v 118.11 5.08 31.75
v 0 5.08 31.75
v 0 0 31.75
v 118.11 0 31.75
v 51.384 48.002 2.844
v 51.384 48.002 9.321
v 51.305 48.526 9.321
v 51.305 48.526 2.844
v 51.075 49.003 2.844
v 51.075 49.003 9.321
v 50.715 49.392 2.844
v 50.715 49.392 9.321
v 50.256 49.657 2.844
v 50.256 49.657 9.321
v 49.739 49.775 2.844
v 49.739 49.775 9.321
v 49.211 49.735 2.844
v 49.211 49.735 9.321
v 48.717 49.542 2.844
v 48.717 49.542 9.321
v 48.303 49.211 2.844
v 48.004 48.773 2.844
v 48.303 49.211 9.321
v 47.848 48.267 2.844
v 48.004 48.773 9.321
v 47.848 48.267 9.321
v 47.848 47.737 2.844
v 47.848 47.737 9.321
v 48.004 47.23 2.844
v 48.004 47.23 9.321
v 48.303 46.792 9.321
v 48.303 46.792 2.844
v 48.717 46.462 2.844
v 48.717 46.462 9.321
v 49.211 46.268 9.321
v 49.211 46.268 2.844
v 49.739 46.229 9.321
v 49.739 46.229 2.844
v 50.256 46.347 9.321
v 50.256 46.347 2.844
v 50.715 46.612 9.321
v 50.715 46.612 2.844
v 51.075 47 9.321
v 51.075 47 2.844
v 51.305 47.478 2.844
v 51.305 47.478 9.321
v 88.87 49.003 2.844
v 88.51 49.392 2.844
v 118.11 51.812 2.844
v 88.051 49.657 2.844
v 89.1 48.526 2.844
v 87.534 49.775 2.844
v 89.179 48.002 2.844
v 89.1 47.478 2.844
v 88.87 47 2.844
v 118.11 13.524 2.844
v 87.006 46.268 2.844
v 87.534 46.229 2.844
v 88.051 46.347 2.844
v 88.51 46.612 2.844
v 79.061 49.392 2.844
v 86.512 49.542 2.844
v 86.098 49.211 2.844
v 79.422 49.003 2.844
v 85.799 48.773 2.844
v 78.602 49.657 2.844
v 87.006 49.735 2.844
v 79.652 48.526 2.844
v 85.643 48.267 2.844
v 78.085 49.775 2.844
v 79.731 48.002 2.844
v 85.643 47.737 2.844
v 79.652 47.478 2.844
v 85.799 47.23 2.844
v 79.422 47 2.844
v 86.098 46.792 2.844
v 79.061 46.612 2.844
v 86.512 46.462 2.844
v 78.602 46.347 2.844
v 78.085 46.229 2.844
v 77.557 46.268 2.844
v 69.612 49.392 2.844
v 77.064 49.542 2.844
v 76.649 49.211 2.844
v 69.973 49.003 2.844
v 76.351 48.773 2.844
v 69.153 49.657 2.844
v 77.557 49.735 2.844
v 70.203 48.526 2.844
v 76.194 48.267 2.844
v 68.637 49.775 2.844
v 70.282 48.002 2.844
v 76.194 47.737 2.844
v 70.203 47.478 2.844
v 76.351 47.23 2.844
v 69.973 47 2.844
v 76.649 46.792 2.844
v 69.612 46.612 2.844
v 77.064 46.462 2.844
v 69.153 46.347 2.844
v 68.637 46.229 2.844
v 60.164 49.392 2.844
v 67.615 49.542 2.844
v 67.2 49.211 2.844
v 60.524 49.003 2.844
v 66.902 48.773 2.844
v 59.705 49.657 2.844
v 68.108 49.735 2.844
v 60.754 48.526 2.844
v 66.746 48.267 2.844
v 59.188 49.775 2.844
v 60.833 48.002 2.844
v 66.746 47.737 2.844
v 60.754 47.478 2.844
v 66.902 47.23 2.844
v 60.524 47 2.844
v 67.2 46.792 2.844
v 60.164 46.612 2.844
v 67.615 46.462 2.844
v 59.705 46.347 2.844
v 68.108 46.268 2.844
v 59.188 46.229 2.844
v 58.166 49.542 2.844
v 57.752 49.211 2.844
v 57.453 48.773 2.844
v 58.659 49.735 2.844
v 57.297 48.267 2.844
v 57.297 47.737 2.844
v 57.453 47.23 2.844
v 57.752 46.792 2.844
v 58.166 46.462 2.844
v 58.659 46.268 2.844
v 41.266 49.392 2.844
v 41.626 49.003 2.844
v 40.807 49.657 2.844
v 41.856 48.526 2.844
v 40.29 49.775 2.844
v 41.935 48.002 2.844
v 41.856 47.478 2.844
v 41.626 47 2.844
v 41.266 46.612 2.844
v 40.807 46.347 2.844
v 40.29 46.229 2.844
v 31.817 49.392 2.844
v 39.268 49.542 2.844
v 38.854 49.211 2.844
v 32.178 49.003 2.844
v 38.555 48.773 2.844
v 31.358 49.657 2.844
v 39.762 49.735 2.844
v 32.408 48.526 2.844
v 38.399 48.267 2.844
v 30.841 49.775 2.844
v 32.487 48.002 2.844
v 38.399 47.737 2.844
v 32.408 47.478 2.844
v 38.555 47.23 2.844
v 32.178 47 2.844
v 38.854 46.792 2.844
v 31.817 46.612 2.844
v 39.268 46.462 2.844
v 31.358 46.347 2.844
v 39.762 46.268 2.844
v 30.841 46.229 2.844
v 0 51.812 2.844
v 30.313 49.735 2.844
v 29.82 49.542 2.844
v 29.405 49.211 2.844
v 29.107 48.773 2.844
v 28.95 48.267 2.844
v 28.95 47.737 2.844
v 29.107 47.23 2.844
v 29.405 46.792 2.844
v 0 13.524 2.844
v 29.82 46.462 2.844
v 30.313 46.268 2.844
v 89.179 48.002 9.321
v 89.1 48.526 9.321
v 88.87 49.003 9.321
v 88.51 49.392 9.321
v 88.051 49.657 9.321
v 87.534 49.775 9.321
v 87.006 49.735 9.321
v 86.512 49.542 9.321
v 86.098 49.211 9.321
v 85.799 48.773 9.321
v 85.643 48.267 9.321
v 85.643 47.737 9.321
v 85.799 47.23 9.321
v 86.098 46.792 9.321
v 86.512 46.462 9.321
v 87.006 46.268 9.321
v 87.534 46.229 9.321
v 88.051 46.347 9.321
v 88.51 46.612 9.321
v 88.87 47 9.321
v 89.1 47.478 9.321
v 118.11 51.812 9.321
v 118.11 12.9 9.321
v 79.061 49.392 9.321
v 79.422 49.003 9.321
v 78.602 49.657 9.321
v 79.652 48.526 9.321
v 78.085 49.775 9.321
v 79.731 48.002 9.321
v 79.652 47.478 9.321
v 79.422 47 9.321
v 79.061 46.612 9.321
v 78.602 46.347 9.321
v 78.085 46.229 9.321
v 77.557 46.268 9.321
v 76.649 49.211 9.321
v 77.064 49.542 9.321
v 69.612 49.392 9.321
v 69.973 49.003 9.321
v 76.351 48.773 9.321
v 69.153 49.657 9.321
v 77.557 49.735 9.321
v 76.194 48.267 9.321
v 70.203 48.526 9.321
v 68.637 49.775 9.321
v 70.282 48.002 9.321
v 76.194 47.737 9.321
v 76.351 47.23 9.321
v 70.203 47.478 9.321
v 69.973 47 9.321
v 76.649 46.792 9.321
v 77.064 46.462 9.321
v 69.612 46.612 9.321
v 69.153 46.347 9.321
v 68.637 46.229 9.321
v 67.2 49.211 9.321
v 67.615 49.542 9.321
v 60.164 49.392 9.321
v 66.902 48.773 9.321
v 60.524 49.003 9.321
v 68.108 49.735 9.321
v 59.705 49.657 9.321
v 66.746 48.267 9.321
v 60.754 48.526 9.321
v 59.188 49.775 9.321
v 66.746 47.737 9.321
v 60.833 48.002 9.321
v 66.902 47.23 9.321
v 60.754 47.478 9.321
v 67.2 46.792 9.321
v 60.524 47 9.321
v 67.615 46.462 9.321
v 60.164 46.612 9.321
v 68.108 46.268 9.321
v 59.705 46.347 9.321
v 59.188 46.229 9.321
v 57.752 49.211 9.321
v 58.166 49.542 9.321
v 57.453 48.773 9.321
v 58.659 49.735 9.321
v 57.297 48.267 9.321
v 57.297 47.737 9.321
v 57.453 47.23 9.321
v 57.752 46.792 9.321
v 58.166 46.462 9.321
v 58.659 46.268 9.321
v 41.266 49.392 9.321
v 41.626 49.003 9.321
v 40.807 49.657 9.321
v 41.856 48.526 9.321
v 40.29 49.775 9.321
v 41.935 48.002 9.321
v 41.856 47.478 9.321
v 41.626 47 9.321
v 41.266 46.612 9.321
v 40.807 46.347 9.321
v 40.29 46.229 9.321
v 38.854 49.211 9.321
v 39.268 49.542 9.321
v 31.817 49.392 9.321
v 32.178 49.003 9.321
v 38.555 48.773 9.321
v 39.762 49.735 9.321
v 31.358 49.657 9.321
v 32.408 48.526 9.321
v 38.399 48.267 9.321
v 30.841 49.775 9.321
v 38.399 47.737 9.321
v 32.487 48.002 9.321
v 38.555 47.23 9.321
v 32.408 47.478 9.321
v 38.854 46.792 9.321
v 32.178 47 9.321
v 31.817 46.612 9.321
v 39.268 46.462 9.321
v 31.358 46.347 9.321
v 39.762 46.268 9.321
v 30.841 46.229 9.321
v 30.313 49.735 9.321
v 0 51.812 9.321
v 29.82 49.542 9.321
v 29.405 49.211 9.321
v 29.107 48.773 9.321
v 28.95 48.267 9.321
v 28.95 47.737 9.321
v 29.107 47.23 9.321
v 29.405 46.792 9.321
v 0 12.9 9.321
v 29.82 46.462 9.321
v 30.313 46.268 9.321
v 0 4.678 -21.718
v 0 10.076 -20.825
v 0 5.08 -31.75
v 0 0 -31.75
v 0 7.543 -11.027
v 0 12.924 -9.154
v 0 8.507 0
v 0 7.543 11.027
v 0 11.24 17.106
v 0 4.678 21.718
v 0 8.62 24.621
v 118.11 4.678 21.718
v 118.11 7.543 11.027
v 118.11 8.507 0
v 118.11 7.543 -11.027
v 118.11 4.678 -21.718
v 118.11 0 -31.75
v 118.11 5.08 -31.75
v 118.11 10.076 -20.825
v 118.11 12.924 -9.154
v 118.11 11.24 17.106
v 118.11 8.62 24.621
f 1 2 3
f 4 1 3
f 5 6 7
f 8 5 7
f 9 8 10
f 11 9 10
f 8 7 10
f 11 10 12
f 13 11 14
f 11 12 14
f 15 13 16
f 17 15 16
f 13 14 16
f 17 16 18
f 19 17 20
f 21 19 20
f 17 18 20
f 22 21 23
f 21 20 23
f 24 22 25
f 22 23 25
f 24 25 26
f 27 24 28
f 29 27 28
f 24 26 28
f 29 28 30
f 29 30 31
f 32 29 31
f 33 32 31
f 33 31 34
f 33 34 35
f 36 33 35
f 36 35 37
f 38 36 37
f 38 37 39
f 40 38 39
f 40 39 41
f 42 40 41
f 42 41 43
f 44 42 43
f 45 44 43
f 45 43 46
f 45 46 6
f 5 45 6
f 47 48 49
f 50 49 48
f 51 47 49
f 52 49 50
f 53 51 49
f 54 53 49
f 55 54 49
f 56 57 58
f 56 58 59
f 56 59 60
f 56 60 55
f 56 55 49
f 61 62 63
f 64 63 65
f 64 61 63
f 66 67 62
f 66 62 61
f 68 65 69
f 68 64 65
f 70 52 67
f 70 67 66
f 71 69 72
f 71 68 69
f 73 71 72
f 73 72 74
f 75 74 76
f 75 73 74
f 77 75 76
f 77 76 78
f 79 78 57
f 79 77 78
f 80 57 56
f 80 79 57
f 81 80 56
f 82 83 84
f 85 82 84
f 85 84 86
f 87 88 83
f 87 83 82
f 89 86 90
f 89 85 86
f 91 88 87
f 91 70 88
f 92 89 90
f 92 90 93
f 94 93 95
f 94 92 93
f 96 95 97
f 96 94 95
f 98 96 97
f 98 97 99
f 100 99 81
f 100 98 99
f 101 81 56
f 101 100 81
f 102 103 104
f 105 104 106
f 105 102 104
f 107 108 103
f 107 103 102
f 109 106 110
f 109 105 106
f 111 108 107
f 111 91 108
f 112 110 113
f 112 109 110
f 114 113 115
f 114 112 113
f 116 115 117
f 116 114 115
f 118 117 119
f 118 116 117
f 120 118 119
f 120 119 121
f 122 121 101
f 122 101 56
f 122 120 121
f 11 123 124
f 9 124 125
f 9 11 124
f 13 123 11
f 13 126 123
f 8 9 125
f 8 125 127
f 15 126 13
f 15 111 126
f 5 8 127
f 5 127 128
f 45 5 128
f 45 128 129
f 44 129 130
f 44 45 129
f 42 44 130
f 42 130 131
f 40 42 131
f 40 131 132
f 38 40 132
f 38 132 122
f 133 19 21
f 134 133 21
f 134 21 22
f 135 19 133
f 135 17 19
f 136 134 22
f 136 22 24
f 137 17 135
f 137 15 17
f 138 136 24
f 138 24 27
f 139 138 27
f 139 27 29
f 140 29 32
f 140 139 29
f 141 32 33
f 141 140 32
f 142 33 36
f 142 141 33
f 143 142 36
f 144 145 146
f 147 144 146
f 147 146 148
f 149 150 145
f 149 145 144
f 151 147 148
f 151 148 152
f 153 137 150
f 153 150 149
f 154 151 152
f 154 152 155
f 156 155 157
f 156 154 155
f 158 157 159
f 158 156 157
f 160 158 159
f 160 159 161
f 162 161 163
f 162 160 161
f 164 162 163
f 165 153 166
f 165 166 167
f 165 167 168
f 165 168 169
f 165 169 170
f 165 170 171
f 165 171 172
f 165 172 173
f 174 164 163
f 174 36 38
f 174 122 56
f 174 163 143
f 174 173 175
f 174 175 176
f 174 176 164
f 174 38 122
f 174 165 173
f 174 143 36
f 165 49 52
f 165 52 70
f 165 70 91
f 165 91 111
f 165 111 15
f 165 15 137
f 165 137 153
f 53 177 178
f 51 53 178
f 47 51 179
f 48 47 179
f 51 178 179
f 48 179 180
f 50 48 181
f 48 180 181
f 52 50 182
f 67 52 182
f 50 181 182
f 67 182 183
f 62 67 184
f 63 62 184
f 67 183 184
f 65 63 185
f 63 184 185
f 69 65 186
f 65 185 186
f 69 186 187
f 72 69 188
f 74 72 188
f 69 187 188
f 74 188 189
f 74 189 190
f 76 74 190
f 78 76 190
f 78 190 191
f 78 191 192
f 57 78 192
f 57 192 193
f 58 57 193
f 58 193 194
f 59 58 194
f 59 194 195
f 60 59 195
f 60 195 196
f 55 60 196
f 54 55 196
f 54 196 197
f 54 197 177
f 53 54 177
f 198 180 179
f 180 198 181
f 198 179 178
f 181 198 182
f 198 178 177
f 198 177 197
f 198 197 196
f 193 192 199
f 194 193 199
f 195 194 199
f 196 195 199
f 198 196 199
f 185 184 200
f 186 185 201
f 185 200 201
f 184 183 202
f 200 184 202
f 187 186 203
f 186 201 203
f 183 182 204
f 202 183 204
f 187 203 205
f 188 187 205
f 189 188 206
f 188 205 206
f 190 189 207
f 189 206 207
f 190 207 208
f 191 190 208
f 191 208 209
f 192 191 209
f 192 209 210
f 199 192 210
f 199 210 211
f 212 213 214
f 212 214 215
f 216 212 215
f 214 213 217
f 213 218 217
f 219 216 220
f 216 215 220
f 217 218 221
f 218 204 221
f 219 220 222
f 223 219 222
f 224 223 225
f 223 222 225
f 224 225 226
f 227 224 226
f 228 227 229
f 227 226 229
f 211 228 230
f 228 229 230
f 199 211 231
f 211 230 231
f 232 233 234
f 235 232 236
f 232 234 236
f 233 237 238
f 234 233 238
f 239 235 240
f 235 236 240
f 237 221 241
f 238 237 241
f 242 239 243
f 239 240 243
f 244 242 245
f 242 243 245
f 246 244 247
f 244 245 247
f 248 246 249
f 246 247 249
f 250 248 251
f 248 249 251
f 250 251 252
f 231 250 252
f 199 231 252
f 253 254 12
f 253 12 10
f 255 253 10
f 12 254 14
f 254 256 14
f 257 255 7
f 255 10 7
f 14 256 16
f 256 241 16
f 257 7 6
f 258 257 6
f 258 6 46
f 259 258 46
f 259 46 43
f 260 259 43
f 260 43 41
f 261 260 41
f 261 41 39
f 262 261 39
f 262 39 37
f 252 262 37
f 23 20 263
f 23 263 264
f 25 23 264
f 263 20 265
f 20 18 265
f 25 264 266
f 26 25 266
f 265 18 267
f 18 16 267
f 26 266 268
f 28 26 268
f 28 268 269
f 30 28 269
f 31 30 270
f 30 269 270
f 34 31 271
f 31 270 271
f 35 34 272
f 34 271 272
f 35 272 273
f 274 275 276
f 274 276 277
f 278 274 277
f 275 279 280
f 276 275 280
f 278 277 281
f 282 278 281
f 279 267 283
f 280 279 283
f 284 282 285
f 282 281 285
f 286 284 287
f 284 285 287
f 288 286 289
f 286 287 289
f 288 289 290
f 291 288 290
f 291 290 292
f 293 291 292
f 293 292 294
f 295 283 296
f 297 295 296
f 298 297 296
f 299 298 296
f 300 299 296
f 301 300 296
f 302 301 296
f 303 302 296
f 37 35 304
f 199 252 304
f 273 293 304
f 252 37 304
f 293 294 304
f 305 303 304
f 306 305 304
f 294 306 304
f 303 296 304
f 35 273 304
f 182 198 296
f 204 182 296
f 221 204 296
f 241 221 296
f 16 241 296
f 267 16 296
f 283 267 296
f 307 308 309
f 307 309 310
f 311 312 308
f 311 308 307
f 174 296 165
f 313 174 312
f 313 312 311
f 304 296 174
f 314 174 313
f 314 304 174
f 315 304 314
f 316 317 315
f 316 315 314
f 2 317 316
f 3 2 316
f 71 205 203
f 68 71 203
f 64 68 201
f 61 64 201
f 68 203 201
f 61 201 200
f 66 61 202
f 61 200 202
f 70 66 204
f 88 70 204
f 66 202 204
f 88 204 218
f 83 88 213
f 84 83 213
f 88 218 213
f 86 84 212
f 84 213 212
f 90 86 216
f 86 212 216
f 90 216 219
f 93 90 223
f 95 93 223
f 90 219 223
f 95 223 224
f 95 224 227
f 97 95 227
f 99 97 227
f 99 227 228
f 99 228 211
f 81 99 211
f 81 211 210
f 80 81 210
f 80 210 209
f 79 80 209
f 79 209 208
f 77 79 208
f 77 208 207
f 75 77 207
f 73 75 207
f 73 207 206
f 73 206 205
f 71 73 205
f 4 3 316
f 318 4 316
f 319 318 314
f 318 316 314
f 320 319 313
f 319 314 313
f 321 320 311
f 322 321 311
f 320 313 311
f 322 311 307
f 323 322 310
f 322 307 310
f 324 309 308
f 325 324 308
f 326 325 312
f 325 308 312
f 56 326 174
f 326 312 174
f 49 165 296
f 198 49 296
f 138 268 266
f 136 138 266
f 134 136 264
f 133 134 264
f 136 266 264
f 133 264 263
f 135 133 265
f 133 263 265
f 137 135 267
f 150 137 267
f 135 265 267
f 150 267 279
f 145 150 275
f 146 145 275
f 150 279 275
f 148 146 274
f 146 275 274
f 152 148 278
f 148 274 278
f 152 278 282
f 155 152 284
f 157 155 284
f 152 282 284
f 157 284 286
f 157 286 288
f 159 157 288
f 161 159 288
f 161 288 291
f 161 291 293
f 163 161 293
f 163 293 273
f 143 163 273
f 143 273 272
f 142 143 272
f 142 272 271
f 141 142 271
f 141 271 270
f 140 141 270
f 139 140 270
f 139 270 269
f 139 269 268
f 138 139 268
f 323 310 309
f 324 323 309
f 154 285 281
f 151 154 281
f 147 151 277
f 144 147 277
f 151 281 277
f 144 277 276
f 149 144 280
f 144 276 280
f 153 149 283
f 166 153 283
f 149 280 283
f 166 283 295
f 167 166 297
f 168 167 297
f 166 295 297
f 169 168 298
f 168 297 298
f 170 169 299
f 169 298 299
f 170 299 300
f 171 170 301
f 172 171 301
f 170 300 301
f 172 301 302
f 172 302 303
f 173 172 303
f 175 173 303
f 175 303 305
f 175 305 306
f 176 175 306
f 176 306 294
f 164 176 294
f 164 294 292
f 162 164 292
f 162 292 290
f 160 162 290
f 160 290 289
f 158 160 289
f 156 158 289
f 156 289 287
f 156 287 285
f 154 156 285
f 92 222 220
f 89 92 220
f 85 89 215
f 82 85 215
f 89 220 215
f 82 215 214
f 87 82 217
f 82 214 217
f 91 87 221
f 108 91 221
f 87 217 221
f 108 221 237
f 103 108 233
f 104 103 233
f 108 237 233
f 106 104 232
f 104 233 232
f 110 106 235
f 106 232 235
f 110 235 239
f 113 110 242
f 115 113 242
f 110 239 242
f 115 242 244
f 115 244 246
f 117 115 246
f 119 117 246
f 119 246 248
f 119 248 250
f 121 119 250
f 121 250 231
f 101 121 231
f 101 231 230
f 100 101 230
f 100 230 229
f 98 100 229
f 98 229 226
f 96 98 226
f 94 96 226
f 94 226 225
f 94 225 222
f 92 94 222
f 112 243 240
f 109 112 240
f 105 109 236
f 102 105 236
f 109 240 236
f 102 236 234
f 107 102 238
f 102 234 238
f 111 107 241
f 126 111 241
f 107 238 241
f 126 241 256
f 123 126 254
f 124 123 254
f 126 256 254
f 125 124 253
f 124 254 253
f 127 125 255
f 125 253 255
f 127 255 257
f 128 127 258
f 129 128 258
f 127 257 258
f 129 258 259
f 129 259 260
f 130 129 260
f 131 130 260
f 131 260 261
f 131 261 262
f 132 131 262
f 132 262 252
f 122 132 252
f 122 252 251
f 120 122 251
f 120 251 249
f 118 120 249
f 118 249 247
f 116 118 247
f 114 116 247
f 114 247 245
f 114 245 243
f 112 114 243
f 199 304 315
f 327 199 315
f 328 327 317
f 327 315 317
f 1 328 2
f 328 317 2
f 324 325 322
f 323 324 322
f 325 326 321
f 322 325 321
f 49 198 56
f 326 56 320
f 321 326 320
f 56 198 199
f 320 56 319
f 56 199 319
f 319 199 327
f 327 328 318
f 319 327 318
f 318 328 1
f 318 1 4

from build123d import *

# Parameters (mm, degrees)
F1_DEPTH = 118.11
F2_W     = 39.04492
F2_H     = 6.477
F3_DEPTH = 118.11
F4_R     = 1.778
F5_DEPTH = 25.4


with BuildPart() as f1:
    # F0 (on Right) → F1 (new body)
    with BuildSketch(Plane.YZ):
        with BuildLine():
            ThreePointArc((0, 31.75), (8.507387, 0), (0, -31.75))
            Line((0, -31.75), (5.08, -31.75))
            ThreePointArc((5.08, -31.75), (13.587387, 0), (5.08, 31.75))
            Line((5.08, 31.75), (0, 31.75))
        make_face()
    extrude(amount=F1_DEPTH)

    # F2 (on face) → F3 (join, through all)
    with BuildSketch(Plane(origin=(0, 0, 0), x_dir=(0, -1, 0), z_dir=(-1, 0, 0))):
        with Locations((-32.289425, 6.082614)):
            Rectangle(F2_W, F2_H)
    extrude(amount=-F3_DEPTH)

    # F4 (on face) → F5 (cut)
    with BuildSketch(Plane.XY.offset(9.321114)):
        with Locations((59.055, 48.001833)):
            Circle(F4_R)
        with Locations((49.6062, 48.001833)):
            Circle(F4_R)
        with Locations((40.1574, 48.001833)):
            Circle(F4_R)
        with Locations((68.5038, 48.001833)):
            Circle(F4_R)
        with Locations((77.9526, 48.001833)):
            Circle(F4_R)
        with Locations((30.7086, 48.001833)):
            Circle(F4_R)
        with Locations((87.4014, 48.001833)):
            Circle(F4_R)
    extrude(amount=-F5_DEPTH, mode=Mode.SUBTRACT)


solid = f1.part
